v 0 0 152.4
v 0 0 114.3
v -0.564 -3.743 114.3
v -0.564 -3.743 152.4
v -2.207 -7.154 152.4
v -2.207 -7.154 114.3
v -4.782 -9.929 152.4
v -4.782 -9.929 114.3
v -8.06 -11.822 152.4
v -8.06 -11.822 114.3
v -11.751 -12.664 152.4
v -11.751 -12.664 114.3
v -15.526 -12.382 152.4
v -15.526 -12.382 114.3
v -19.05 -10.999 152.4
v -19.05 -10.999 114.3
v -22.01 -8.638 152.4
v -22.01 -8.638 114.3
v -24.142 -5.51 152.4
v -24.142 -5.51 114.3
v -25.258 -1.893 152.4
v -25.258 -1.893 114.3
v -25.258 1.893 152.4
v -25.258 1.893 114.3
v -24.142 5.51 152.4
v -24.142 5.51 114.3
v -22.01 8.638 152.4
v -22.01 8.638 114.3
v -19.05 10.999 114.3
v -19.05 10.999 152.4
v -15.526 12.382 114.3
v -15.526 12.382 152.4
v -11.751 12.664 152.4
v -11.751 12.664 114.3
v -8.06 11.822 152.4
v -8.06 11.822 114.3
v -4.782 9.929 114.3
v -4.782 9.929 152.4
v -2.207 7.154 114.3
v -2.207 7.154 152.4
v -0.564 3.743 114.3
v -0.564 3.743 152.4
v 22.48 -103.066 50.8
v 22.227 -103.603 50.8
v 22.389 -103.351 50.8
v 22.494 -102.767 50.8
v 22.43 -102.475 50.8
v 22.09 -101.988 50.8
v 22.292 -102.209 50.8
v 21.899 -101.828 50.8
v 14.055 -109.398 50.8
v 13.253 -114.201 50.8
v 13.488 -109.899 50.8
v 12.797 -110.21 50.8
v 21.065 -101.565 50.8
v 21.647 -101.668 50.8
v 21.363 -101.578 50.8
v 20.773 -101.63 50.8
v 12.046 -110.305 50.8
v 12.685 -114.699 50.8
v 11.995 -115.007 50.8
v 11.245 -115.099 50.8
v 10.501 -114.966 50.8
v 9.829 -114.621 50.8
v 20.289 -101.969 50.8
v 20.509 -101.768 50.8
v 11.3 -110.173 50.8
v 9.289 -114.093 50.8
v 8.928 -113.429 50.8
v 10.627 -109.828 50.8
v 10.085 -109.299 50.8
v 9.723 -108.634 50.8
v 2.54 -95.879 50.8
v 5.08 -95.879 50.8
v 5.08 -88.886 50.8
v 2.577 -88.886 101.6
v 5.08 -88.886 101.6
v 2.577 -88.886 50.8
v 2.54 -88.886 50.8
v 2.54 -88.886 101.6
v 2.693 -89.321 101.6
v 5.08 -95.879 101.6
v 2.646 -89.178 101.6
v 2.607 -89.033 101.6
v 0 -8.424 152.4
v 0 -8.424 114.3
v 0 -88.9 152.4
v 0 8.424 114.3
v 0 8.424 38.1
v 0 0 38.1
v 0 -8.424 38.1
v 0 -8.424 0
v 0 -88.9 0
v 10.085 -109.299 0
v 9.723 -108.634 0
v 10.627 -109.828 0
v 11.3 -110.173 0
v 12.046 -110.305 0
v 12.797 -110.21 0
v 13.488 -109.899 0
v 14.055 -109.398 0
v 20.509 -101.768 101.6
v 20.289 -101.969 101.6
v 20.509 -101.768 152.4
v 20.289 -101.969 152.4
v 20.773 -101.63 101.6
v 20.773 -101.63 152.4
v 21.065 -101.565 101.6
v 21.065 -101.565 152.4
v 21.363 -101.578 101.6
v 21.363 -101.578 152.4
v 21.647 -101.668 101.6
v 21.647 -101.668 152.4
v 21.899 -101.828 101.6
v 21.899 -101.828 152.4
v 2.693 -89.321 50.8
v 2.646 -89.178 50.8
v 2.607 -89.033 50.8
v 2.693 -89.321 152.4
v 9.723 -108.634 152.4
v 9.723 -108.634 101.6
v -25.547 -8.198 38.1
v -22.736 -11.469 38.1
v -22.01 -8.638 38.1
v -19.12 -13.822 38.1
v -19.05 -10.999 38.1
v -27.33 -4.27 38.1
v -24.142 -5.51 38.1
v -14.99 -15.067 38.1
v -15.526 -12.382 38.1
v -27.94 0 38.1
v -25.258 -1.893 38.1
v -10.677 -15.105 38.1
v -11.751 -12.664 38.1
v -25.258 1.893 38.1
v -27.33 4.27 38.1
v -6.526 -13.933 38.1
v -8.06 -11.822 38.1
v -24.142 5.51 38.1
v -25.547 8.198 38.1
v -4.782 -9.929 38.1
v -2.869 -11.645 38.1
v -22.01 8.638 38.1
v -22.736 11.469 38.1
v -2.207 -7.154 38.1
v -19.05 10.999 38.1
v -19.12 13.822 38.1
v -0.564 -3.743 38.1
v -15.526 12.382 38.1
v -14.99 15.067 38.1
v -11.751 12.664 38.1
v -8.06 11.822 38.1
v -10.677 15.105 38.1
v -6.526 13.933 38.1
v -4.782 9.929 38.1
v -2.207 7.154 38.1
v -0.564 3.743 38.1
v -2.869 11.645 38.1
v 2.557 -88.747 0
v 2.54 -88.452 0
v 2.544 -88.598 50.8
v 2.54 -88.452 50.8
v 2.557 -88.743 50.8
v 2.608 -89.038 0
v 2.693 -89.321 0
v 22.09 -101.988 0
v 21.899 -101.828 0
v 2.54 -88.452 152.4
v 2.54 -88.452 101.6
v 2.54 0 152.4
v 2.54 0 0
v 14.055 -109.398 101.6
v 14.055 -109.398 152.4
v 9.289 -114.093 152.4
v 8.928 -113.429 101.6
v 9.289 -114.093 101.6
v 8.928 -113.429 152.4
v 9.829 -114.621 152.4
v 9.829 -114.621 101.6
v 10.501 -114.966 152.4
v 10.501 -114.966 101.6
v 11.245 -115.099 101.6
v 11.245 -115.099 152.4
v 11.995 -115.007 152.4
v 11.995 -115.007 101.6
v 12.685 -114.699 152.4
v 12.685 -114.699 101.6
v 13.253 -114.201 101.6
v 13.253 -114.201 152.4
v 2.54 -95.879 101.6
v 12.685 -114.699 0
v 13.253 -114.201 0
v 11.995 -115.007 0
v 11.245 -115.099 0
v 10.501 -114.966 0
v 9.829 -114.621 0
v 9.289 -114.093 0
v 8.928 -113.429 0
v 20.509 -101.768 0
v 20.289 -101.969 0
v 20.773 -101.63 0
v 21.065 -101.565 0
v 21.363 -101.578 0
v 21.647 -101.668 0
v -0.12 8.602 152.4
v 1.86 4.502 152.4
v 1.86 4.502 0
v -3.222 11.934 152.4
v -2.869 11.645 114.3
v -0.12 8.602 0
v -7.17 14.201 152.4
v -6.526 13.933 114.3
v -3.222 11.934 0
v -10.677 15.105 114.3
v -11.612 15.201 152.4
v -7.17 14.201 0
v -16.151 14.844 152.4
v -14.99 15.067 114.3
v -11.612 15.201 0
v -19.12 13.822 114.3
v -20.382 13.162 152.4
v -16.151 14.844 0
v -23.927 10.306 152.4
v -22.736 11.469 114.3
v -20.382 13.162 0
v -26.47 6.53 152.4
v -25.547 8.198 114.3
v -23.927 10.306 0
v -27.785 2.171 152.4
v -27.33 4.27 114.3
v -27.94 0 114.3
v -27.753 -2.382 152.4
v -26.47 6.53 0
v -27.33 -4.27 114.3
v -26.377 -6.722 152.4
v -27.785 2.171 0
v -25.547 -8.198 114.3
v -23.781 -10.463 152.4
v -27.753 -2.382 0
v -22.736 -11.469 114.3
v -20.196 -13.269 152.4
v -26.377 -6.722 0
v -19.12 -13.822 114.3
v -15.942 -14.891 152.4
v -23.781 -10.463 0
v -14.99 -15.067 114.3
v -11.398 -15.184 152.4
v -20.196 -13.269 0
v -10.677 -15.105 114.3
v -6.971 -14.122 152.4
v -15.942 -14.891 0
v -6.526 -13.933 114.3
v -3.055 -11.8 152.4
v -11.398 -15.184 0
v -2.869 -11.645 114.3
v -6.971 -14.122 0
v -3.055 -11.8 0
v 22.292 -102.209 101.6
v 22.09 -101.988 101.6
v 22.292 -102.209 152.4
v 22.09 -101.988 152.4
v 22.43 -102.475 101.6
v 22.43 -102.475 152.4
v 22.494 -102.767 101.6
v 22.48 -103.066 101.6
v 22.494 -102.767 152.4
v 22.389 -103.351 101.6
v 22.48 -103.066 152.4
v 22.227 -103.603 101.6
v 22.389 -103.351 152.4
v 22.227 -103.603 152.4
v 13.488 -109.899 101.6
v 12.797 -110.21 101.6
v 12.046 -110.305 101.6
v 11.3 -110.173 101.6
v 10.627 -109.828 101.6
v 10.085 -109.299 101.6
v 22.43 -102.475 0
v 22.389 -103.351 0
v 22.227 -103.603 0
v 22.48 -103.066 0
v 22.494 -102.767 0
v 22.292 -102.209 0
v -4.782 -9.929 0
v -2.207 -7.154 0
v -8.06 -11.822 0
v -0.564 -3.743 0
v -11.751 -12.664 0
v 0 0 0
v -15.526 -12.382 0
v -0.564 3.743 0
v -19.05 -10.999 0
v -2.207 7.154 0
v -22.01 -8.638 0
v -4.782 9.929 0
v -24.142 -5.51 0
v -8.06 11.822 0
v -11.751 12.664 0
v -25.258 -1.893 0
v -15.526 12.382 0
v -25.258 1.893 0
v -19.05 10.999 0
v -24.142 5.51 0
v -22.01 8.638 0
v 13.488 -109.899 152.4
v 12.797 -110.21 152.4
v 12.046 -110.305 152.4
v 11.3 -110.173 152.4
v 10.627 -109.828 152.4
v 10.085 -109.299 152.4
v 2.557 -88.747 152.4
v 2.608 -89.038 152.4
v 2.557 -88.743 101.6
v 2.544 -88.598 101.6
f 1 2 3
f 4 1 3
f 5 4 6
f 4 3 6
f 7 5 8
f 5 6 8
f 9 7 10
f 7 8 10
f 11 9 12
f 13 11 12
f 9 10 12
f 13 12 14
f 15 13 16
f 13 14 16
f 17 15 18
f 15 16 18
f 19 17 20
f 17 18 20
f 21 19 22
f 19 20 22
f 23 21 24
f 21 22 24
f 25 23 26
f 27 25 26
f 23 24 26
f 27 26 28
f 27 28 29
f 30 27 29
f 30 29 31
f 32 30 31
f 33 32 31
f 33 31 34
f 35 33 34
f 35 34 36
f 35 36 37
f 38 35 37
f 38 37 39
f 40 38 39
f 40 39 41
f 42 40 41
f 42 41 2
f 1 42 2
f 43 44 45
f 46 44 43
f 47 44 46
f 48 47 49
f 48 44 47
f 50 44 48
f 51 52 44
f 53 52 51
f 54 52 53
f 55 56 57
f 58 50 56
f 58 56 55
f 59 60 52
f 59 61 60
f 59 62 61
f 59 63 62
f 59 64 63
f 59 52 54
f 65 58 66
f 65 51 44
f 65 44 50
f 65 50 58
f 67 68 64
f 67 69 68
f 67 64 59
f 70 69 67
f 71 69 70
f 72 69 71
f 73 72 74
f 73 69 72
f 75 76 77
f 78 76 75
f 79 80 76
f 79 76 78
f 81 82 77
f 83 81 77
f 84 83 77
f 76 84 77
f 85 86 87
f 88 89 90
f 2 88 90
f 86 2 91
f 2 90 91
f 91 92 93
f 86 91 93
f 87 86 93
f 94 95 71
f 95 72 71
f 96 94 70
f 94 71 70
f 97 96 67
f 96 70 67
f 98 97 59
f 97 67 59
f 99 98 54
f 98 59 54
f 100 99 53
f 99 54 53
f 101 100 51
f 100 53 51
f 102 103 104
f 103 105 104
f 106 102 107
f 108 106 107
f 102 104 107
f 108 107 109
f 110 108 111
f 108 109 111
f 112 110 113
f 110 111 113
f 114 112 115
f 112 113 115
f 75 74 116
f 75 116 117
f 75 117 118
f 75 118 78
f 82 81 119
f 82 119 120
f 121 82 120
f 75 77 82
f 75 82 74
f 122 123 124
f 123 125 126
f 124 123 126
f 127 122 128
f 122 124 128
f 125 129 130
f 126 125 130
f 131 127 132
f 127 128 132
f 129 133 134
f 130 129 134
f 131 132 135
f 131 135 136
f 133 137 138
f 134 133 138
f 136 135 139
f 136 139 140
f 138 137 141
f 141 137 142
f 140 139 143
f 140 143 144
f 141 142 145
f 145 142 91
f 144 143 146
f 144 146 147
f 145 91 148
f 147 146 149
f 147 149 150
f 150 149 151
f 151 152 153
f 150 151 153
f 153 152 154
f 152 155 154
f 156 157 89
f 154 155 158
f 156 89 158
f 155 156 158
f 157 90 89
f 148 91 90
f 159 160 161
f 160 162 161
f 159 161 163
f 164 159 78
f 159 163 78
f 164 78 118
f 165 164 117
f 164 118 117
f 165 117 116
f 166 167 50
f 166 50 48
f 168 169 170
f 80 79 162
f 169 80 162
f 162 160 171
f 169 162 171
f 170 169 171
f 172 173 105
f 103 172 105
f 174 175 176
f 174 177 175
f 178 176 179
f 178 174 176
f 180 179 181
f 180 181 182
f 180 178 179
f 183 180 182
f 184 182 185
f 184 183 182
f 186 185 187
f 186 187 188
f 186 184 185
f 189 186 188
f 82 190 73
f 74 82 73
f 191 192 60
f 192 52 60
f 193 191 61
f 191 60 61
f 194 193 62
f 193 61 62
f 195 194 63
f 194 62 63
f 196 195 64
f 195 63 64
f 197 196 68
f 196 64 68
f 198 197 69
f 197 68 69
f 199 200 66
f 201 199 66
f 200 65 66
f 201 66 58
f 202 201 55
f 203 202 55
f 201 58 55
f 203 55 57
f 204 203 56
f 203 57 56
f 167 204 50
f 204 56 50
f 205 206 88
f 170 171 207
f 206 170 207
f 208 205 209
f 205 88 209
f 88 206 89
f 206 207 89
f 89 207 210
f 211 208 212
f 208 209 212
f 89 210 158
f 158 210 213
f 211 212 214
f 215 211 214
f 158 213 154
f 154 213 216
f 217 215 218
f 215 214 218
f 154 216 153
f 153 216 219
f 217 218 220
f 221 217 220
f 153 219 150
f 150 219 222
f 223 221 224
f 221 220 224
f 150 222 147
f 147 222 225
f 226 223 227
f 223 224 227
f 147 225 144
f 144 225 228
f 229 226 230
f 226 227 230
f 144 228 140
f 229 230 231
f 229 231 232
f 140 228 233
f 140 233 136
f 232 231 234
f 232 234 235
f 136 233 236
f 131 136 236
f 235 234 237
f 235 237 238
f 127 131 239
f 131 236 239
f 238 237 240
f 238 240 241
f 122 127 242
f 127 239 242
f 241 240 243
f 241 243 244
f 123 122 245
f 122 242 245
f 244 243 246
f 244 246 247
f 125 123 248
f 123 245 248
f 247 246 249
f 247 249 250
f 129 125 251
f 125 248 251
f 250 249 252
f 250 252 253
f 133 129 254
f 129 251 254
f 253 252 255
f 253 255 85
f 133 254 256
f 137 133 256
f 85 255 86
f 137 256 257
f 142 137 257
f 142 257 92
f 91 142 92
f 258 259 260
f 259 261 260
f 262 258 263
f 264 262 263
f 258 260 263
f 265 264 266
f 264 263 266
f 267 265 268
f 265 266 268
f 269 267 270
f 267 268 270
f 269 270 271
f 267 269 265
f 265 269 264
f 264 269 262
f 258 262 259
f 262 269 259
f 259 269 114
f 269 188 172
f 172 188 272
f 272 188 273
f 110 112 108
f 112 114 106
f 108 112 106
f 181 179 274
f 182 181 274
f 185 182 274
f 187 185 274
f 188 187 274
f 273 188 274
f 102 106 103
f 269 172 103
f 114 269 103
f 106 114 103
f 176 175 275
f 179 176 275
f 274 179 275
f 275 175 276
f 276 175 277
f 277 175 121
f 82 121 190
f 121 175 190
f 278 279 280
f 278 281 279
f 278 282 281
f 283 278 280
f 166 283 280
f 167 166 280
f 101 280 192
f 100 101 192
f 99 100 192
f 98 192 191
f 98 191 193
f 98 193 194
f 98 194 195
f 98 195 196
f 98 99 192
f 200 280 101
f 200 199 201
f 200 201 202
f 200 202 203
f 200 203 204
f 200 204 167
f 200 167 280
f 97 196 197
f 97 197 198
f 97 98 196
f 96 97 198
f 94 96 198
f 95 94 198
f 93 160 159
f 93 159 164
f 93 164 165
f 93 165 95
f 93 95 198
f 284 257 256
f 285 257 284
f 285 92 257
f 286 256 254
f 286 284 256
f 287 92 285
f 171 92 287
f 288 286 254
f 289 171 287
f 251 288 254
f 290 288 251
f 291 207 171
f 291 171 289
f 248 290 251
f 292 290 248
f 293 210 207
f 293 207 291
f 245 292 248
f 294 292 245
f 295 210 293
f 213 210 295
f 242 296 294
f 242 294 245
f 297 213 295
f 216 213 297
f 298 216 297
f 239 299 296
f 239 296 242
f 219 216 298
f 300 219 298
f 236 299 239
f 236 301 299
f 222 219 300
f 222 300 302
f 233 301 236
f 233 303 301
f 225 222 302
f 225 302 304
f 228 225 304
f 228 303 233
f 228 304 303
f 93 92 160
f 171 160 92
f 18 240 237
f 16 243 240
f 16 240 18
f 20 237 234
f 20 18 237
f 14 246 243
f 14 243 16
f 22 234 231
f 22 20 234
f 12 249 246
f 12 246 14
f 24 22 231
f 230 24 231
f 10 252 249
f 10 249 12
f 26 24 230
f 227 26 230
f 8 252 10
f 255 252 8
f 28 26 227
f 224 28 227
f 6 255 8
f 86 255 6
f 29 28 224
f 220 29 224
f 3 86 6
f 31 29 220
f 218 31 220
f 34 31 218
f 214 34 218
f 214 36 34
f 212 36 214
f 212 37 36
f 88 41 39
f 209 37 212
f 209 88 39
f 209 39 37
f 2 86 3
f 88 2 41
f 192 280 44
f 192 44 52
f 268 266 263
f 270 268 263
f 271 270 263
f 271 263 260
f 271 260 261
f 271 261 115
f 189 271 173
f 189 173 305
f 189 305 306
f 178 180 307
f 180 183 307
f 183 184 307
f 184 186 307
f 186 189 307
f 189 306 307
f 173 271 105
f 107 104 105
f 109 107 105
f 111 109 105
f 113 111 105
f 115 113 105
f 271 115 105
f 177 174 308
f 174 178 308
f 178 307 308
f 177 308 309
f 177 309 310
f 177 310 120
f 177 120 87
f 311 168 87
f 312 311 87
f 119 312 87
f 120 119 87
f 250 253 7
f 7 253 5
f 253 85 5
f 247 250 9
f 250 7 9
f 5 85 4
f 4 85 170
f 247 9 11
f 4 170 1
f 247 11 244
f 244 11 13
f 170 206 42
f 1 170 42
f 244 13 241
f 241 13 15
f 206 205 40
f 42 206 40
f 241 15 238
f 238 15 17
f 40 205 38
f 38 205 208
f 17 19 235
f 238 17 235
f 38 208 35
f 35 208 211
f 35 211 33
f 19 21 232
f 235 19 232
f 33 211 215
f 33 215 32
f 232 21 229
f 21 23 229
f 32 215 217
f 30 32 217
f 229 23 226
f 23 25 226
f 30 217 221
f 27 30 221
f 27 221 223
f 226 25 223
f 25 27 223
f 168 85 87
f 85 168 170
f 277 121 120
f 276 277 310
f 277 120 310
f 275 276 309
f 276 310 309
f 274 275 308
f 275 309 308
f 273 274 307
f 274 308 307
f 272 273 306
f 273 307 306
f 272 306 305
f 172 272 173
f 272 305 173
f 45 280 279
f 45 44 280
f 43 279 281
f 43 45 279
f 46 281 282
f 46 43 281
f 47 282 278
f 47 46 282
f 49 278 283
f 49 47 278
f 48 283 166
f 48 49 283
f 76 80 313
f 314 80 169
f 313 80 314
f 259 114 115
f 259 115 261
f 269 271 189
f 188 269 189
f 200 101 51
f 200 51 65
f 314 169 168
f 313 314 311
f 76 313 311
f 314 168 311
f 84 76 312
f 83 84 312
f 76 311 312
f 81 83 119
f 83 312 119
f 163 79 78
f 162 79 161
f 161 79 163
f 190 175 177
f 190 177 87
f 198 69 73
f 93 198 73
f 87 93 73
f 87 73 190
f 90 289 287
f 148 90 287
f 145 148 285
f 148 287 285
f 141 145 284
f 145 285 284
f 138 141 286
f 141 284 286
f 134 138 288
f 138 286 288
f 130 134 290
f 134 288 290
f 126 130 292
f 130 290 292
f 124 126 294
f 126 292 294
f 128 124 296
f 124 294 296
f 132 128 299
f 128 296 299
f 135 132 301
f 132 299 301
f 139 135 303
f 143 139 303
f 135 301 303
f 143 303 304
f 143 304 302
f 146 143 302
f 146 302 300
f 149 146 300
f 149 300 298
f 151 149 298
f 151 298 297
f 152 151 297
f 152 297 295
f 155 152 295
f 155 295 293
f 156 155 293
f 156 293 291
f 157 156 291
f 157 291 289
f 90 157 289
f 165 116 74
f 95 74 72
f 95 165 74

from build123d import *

# Parameters (mm, degrees)
SKETCH1_R           = 12.7
BOSS_EXTRUDE1_DEPTH = 152.4
CUT_EXTRUDE1_REACH  = 196.861
SKETCH2_W           = 50.8
SKETCH2_H           = 91.59656884
FILLET1_R           = 2.54
FILLET3_R           = 1.143
SKETCH4_W           = 76.2
SKETCH4_H           = 60.96
CUT_EXTRUDE3_DEPTH  = 38.1
SKETCH5_W           = 50.8
SKETCH5_H           = 6.992097594
BOSS_EXTRUDE2_DEPTH = 2.54


with BuildPart() as part:
    # Sketch1 → Boss-Extrude1 (new body)
    # profile 1 of 4: a face of its own
    with BuildSketch(Plane.XY):
        with BuildLine():
            Line((0, -8.424226968), (0, 0))
            Line((0, 0), (2.54, 0))
            ThreePointArc((2.54, 0), (-27.291189122, 4.399409051), (0, -8.424226968))
        make_face()
        with Locations(Location((-12.7, 0, 0), (0, 0, 180))):
            Circle(SKETCH1_R, mode=Mode.SUBTRACT)
    # profile 2 of 4: a face of its own
    with BuildSketch(Plane.XY):
        with BuildLine():
            Line((2.54, 0), (0, 0))
            Line((0, 0), (0, -8.424226968))
            ThreePointArc((0, -8.424226968), (1.891189122, -4.399409051), (2.54, 0))
        make_face()
    # profile 3 of 4: a face of its own
    with BuildSketch(Plane.XY):
        with BuildLine():
            ThreePointArc((2.54, 0), (1.891189122, -4.399409051), (0, -8.424226968))
            Line((0, -8.424226968), (0, -88.9))
            Line((0, -88.9), (2.54, -88.9))
            Line((2.54, -88.9), (2.54, 0))
        make_face()
    # profile 4 of 4: a face of its own
    with BuildSketch(Plane.XY):
        Polygon((22.969147698, -102.726355783), (10.424773969, -117.541831082), (0, -88.9), (2.54, -88.9), (11.22731164, -112.768192568), (21.023394812, -101.093675255), align=None)
    extrude(amount=BOSS_EXTRUDE1_DEPTH)

    # Sketch2 → Cut-Extrude1 (cut, up to next)
    with BuildSketch(Plane(origin=(2.54, 0, 0), x_dir=(0, 0, -1), z_dir=(1, 0, 0)), mode=Mode.PRIVATE) as cut_extrude1_sk1:
        with Locations((-76.2, -90.24828442)):
            Rectangle(SKETCH2_W, SKETCH2_H)
    cut_extrude1_tool1 = extrude(cut_extrude1_sk1.sketch, amount=CUT_EXTRUDE1_REACH, mode=Mode.PRIVATE) & part.part
    add(cut_extrude1_tool1.solids().sort_by_distance((2.54, -90.248284, 76.2))[0], mode=Mode.SUBTRACT)

    # Fillet1
    fillet1_edges = [part.edges().sort_by_distance(p)[0] for p in [
        (2.54, -88.9, 127),
        (11.22731164, -112.768192568, 127),
        (10.424773969, -117.541831082, 127),
        (2.54, -88.9, 25.4),
        (11.22731164, -112.768192568, 25.4),
        (10.424773969, -117.541831082, 25.4),
    ]]
    fillet(fillet1_edges, radius=FILLET1_R)

    # Fillet3
    fillet3_edges = [part.edges().sort_by_distance(p)[0] for p in [
        (21.023394812, -101.093675255, 127),
        (22.969147698, -102.726355783, 127),
        (21.023394812, -101.093675255, 25.4),
        (22.969147698, -102.726355783, 25.4),
    ]]
    fillet(fillet3_edges, radius=FILLET3_R)

    # Sketch4 → Cut-Extrude3 (cut)
    with BuildSketch(Plane.ZY):
        with Locations((76.2, 15.24)):
            Rectangle(SKETCH4_W, SKETCH4_H)
    extrude(amount=CUT_EXTRUDE3_DEPTH, mode=Mode.SUBTRACT)

    # Sketch5 → Boss-Extrude2 (add)
    with BuildSketch(Plane(origin=(2.54, 0, 0), x_dir=(0, 0, -1), z_dir=(1, 0, 0))):
        with Locations((-76.2, -92.382543848)):
            Rectangle(SKETCH5_W, SKETCH5_H)
    extrude(amount=BOSS_EXTRUDE2_DEPTH)


solid = part.part
